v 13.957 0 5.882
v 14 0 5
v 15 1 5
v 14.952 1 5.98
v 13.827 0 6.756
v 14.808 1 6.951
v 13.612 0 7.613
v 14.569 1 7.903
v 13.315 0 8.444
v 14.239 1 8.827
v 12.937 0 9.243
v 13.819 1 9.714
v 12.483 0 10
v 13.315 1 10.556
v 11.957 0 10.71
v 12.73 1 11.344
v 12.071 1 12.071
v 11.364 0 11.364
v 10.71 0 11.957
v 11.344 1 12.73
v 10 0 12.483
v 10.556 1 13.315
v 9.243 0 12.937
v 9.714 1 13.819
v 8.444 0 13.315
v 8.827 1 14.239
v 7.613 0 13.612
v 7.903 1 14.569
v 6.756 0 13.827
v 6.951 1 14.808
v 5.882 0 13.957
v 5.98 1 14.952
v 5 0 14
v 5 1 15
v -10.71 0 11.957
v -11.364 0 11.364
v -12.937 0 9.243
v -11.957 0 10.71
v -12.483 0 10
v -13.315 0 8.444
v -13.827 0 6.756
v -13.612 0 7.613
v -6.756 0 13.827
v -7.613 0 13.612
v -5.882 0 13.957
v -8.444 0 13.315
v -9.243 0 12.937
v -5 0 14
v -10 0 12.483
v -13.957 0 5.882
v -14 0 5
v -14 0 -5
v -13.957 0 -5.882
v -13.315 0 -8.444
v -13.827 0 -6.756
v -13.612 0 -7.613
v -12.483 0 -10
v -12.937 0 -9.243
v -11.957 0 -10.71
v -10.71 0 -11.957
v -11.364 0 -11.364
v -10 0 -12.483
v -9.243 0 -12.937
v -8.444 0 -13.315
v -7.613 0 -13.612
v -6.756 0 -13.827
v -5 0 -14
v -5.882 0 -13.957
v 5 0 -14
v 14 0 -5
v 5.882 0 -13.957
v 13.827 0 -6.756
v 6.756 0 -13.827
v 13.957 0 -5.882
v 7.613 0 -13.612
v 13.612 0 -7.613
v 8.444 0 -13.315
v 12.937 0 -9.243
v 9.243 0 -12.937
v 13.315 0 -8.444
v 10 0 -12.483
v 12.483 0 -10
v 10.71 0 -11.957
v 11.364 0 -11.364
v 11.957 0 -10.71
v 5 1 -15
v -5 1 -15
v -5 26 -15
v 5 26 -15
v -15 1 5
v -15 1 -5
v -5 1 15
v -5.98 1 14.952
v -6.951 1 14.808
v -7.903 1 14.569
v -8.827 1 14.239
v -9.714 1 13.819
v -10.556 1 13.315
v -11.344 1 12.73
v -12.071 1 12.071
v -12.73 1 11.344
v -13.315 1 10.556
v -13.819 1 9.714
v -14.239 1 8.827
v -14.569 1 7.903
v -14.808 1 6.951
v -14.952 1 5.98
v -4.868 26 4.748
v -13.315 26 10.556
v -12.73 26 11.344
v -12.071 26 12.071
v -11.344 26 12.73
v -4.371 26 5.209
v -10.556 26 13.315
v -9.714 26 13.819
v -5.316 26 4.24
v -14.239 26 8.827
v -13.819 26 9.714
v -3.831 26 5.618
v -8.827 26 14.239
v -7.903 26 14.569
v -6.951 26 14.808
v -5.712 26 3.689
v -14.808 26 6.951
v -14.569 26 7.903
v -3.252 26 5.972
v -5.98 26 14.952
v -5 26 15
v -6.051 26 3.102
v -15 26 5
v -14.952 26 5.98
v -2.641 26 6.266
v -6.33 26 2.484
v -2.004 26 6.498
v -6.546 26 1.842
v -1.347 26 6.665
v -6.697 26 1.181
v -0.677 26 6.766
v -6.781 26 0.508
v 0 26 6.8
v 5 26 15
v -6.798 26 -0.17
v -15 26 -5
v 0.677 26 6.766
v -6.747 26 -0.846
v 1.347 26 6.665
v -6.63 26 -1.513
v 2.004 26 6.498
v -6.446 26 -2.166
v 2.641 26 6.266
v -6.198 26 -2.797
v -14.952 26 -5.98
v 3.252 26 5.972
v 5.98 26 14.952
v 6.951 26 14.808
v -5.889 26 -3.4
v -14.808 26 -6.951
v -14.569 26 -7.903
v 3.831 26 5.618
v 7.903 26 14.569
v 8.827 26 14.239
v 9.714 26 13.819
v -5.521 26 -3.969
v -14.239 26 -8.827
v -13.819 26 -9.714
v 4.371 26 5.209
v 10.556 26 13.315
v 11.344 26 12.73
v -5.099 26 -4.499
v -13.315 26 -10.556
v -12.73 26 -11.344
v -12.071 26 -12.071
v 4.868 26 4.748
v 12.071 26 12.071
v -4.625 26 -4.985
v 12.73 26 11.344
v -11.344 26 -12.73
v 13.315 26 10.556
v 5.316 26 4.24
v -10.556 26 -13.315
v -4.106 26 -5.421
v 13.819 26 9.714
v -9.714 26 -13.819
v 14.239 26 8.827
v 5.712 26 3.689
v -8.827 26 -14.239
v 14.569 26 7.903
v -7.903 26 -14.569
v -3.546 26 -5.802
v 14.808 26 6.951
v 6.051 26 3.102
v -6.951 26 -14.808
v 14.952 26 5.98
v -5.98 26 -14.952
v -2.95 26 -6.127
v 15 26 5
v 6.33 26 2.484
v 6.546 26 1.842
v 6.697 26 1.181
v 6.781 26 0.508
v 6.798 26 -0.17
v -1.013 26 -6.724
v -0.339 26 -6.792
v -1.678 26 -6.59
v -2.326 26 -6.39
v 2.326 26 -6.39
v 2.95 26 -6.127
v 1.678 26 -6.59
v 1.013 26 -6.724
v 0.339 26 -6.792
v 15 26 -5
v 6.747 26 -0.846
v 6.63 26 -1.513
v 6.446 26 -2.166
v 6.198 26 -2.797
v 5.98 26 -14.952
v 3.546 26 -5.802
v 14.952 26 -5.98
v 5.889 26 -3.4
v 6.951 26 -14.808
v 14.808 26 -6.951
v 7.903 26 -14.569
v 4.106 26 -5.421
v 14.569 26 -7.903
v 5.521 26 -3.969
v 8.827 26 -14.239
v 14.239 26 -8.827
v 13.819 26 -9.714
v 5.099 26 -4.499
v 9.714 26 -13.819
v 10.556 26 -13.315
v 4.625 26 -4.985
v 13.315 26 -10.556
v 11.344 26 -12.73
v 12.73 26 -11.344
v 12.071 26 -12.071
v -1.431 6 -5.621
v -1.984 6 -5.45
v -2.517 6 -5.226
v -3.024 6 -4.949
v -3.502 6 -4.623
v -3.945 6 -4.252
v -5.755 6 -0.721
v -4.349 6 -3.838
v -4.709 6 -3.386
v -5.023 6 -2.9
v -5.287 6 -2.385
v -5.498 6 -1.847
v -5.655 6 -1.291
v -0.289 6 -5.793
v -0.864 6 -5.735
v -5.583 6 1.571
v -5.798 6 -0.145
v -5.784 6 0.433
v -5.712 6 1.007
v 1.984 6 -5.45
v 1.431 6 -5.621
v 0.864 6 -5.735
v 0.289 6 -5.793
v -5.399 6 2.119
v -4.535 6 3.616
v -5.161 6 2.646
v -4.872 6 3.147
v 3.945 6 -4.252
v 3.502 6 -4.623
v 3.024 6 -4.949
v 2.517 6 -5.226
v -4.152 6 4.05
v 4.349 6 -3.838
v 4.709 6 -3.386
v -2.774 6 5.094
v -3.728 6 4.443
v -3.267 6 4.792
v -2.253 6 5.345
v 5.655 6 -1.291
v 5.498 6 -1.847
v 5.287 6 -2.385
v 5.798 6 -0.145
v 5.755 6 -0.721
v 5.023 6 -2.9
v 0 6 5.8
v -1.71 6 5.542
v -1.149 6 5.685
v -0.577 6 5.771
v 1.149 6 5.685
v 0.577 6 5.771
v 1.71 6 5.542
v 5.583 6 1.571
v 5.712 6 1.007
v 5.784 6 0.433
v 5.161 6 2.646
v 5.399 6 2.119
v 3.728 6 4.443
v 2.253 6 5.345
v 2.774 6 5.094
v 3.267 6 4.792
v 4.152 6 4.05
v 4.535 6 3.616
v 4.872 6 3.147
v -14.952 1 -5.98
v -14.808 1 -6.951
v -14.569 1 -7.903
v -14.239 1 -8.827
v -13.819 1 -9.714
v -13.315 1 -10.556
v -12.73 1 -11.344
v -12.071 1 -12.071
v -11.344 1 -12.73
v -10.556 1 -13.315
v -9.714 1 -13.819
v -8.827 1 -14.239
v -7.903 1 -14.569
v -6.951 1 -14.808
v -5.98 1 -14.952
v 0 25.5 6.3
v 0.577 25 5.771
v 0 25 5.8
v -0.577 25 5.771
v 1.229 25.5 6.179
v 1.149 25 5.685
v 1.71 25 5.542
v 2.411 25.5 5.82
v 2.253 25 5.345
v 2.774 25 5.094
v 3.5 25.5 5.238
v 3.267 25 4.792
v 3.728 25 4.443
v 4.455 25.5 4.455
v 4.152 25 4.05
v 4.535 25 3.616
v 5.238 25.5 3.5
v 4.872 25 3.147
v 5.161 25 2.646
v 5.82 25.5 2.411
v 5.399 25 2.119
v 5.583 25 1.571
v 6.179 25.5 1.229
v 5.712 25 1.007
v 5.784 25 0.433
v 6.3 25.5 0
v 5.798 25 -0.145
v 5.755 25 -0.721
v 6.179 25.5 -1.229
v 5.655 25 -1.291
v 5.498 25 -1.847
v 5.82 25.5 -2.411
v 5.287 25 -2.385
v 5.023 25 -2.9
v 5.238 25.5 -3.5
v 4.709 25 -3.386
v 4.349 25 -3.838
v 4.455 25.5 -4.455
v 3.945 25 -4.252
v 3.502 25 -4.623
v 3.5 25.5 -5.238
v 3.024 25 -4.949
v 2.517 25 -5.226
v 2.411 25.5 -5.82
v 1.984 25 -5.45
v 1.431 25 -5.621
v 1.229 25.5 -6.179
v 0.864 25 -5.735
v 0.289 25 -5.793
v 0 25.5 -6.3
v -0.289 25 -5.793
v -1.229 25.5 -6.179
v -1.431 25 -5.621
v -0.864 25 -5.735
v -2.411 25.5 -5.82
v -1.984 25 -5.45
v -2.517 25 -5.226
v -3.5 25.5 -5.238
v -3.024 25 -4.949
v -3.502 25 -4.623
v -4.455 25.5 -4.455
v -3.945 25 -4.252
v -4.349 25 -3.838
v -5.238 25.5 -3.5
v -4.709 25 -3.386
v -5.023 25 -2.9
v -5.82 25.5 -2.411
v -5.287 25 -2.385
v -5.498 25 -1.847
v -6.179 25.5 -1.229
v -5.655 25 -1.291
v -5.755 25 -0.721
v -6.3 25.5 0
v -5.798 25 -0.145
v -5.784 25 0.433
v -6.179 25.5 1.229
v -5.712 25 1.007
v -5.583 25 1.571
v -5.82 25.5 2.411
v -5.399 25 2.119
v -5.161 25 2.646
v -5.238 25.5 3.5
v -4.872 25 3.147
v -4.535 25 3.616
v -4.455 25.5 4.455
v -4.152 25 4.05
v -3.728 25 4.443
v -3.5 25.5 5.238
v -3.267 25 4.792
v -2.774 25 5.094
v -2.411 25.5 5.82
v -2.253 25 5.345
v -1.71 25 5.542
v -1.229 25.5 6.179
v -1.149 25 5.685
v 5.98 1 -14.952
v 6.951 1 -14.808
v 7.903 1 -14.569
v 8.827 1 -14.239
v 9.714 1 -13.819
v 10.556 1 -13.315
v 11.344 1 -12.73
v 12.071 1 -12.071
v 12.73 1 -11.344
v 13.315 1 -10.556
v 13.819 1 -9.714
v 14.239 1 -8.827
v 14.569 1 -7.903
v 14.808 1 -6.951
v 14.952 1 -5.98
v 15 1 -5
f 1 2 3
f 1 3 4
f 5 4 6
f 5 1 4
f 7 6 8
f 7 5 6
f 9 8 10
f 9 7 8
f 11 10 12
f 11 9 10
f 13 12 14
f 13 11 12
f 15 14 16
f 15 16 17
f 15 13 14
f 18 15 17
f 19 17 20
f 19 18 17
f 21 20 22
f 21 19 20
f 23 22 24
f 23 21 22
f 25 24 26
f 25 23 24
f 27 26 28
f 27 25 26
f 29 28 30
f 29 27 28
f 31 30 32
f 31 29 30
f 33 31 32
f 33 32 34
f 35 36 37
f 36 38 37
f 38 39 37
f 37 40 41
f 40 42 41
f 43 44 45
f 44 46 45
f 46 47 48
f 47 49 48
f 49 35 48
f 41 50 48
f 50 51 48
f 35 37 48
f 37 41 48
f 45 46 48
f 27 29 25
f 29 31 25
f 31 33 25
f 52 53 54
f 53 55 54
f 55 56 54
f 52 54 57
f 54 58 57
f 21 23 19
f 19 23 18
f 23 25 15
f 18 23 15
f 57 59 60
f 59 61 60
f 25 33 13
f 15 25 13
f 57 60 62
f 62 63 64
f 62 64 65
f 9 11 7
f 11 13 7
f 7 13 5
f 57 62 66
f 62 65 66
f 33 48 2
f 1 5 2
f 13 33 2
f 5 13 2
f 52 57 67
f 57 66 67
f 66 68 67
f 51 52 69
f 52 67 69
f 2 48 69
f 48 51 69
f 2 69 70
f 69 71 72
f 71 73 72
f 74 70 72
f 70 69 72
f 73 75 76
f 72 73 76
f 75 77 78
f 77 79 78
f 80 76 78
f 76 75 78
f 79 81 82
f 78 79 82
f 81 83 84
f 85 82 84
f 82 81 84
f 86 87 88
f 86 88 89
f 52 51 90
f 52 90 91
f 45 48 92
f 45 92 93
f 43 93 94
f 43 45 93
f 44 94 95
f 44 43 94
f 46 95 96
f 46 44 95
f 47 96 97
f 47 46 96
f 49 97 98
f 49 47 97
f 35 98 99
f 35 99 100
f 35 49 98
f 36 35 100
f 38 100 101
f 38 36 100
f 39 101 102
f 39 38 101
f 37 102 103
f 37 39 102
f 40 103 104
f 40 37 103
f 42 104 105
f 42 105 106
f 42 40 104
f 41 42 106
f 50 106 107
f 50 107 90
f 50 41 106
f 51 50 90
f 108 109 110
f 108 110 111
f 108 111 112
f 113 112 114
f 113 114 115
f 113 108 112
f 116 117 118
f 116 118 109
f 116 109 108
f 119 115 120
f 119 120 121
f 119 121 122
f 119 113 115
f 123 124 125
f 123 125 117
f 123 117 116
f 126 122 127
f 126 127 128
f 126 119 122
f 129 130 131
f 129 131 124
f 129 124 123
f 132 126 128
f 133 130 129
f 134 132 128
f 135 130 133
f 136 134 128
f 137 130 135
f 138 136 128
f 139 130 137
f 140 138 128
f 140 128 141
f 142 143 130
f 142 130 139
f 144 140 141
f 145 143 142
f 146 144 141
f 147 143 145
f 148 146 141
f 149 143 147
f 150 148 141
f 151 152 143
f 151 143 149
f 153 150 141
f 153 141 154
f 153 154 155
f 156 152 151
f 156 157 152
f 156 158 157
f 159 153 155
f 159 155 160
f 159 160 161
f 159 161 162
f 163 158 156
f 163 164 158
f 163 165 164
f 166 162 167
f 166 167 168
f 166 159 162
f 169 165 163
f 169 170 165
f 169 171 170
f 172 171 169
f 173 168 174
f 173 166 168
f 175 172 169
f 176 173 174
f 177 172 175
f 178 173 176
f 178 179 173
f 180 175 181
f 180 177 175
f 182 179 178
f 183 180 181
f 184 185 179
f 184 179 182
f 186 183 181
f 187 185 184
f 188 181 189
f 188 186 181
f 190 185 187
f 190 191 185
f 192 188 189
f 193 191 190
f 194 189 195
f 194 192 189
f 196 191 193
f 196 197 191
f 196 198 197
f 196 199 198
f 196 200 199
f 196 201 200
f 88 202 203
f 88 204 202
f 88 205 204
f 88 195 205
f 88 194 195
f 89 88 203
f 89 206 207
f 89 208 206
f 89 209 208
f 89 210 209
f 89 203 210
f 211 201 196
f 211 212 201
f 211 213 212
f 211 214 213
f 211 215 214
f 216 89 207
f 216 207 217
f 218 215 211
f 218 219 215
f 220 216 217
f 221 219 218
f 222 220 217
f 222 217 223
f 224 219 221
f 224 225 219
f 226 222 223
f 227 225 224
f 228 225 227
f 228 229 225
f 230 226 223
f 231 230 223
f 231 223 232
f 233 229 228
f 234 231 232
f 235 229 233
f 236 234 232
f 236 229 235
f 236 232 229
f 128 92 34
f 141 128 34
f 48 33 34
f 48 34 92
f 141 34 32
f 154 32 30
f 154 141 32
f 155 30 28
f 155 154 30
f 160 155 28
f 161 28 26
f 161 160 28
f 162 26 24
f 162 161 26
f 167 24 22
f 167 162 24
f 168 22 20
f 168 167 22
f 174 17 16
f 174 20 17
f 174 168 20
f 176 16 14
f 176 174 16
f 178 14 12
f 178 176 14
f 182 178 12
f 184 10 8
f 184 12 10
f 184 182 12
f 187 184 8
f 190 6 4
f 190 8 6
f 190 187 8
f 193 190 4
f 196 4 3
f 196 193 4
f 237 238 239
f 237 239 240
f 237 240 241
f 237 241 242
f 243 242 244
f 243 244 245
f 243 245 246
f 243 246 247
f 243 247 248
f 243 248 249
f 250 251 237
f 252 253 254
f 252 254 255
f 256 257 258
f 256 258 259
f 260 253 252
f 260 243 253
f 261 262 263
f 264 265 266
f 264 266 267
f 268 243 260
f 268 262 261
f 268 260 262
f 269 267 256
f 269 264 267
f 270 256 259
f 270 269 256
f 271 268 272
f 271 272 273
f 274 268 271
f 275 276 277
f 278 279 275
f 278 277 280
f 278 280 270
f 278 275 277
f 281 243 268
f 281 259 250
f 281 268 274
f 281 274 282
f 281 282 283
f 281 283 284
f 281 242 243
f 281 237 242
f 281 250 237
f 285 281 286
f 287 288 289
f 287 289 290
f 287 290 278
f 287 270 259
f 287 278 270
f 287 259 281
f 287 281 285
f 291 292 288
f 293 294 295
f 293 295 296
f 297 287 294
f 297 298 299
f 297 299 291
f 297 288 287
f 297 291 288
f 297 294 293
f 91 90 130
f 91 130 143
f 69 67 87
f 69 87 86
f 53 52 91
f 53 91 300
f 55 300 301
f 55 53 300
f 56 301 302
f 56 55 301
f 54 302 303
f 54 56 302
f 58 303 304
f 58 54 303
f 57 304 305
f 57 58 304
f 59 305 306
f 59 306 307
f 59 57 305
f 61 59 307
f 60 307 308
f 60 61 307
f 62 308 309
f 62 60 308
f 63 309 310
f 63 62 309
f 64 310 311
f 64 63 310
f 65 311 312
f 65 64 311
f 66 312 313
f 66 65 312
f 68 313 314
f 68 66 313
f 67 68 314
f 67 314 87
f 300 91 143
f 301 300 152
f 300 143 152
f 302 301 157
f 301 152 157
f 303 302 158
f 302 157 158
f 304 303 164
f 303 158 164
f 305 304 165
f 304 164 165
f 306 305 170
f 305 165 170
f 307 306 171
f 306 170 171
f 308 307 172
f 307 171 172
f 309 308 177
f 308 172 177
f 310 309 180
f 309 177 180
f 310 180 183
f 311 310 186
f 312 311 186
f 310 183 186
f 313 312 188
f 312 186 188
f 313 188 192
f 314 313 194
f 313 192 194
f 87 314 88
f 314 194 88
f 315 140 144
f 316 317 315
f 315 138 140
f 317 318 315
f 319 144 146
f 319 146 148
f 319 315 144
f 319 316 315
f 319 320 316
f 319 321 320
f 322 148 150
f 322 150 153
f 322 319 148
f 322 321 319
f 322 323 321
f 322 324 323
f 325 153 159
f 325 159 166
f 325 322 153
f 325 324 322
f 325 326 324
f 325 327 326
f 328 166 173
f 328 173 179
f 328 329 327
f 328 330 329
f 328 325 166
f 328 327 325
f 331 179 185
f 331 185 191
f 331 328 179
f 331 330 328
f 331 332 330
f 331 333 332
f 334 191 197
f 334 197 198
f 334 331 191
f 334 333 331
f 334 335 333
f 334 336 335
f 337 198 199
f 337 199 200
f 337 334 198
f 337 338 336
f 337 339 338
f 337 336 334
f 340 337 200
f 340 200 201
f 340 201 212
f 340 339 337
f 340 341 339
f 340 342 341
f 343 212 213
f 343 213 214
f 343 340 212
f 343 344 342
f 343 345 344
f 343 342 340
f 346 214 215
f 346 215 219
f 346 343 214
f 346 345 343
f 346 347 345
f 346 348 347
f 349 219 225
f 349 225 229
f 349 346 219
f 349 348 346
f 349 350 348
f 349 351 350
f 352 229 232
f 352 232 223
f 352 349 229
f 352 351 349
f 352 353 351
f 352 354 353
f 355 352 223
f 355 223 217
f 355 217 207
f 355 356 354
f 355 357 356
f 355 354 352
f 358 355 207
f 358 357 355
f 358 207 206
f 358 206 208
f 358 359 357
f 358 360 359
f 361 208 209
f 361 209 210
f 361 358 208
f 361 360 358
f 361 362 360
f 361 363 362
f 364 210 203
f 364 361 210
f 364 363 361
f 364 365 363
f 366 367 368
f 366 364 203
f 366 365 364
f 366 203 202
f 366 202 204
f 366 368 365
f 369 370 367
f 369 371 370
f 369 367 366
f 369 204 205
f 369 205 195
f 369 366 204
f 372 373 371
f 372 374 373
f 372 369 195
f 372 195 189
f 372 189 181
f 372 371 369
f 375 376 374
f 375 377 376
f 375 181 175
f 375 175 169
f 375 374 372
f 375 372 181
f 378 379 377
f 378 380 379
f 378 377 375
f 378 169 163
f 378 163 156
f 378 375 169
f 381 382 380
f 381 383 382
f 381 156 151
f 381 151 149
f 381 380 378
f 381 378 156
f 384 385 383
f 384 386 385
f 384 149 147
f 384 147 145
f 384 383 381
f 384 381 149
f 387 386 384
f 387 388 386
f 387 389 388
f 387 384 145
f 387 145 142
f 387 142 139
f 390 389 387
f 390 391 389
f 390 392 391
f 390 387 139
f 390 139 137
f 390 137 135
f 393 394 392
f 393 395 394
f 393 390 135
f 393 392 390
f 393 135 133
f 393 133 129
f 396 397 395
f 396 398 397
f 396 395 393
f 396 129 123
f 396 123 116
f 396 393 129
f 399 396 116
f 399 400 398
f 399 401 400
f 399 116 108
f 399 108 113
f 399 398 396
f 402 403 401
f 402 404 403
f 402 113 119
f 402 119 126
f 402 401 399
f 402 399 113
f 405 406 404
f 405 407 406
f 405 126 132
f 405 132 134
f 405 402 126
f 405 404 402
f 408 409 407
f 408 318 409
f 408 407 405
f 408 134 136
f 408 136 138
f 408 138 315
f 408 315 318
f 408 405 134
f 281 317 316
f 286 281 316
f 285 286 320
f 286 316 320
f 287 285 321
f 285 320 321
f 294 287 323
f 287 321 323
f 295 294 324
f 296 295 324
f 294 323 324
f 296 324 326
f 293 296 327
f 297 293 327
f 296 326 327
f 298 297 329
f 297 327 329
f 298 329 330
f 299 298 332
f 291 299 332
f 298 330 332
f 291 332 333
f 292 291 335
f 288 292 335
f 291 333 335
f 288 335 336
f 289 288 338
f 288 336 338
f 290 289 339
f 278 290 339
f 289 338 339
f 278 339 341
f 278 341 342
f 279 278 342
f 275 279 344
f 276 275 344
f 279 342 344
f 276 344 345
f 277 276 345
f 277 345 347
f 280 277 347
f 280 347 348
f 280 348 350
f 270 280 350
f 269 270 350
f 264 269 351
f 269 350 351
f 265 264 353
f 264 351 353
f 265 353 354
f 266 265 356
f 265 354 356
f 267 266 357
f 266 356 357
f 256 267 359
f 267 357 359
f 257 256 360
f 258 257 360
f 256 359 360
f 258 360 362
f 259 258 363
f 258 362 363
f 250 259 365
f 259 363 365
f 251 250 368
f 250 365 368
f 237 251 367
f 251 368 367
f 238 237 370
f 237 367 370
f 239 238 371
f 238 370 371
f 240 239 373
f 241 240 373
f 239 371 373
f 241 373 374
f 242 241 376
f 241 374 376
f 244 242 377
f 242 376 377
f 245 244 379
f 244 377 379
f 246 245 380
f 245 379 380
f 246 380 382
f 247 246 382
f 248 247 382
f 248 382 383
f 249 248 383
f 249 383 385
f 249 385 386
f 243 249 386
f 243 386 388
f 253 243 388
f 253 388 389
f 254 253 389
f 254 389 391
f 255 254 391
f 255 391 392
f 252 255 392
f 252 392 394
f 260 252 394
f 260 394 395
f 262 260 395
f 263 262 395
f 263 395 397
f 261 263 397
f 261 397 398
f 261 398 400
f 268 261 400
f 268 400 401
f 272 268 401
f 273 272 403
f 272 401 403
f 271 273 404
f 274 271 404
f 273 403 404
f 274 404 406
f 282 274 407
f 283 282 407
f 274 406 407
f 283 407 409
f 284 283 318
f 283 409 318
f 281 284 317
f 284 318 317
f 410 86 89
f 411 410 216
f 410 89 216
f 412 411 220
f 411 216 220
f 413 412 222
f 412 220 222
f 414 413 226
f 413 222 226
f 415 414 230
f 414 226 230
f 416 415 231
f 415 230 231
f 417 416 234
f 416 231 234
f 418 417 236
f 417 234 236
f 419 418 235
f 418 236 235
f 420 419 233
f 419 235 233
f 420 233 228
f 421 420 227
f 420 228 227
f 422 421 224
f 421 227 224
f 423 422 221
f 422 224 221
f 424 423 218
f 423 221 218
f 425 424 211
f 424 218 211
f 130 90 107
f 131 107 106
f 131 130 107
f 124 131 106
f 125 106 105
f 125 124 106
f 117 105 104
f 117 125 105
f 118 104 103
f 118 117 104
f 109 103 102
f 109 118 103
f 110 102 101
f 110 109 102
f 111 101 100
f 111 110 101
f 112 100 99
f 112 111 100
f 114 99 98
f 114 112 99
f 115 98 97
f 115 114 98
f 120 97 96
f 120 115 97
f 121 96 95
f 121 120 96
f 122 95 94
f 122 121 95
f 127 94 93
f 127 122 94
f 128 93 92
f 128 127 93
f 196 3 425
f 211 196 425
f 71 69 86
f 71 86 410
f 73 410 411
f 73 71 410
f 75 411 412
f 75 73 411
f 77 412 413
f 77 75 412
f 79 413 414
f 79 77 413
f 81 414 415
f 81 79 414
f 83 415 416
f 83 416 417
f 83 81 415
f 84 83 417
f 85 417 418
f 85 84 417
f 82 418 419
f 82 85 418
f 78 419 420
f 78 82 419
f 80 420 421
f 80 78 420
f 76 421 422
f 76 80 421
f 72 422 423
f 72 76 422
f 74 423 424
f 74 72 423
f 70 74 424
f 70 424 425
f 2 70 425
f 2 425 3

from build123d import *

# Parameters (mm, degrees)
SKETCH_1_W          = 30
SKETCH_1_H          = 30
EXTRUDE_1_DEPTH     = 26
SKETCH_2_R          = 5.8
CUT_EXTRUDE_1_DEPTH = 20
FILLET_1_R          = 10
CHAMFER_1_SIZE      = 1
CHAMFER_2_SIZE      = 1


with BuildPart() as part:
    # Эскиз1 → Бобышка-Вытянуть1 (new body)
    with BuildSketch(Plane(origin=(0, 0, 0), x_dir=(1, 0, 0), z_dir=(0, 1, 0))):
        Rectangle(SKETCH_1_W, SKETCH_1_H)
    extrude(amount=EXTRUDE_1_DEPTH)

    # Эскиз2 → Вырез-Вытянуть1 (cut)
    with BuildSketch(Plane(origin=(0, 26, 0), x_dir=(1, 0, 0), z_dir=(0, 1, 0))):
        with Locations(Location((0, 0, 0), (0, 0, 270))):
            Circle(SKETCH_2_R)
    extrude(amount=-CUT_EXTRUDE_1_DEPTH, mode=Mode.SUBTRACT)

    # Скругление1
    fillet_1_edges = [part.edges().sort_by_distance(p)[0] for p in [
        (15, 13, 15),
        (-15, 13, 15),
        (-15, 13, -15),
        (15, 13, -15),
    ]]
    fillet(fillet_1_edges, radius=FILLET_1_R)

    # Фаска1
    chamfer_1_edges = [part.edges().sort_by_distance(p)[0] for p in [
        (-15, 0, 0),
        (15, 0, 0),
        (0, 0, 15),
        (0, 0, -15),
        (12.071067812, 0, 12.071067812),
        (-12.071067812, 0, 12.071067812),
        (12.071067812, 0, -12.071067812),
        (-12.071067812, 0, -12.071067812),
    ]]
    chamfer(chamfer_1_edges, length=CHAMFER_1_SIZE)

    # Фаска2
    chamfer_2_edges = [part.edges().sort_by_distance(p)[0] for p in [
        (0, 26, -5.8),
    ]]
    chamfer(chamfer_2_edges, length=CHAMFER_2_SIZE)


solid = part.part
